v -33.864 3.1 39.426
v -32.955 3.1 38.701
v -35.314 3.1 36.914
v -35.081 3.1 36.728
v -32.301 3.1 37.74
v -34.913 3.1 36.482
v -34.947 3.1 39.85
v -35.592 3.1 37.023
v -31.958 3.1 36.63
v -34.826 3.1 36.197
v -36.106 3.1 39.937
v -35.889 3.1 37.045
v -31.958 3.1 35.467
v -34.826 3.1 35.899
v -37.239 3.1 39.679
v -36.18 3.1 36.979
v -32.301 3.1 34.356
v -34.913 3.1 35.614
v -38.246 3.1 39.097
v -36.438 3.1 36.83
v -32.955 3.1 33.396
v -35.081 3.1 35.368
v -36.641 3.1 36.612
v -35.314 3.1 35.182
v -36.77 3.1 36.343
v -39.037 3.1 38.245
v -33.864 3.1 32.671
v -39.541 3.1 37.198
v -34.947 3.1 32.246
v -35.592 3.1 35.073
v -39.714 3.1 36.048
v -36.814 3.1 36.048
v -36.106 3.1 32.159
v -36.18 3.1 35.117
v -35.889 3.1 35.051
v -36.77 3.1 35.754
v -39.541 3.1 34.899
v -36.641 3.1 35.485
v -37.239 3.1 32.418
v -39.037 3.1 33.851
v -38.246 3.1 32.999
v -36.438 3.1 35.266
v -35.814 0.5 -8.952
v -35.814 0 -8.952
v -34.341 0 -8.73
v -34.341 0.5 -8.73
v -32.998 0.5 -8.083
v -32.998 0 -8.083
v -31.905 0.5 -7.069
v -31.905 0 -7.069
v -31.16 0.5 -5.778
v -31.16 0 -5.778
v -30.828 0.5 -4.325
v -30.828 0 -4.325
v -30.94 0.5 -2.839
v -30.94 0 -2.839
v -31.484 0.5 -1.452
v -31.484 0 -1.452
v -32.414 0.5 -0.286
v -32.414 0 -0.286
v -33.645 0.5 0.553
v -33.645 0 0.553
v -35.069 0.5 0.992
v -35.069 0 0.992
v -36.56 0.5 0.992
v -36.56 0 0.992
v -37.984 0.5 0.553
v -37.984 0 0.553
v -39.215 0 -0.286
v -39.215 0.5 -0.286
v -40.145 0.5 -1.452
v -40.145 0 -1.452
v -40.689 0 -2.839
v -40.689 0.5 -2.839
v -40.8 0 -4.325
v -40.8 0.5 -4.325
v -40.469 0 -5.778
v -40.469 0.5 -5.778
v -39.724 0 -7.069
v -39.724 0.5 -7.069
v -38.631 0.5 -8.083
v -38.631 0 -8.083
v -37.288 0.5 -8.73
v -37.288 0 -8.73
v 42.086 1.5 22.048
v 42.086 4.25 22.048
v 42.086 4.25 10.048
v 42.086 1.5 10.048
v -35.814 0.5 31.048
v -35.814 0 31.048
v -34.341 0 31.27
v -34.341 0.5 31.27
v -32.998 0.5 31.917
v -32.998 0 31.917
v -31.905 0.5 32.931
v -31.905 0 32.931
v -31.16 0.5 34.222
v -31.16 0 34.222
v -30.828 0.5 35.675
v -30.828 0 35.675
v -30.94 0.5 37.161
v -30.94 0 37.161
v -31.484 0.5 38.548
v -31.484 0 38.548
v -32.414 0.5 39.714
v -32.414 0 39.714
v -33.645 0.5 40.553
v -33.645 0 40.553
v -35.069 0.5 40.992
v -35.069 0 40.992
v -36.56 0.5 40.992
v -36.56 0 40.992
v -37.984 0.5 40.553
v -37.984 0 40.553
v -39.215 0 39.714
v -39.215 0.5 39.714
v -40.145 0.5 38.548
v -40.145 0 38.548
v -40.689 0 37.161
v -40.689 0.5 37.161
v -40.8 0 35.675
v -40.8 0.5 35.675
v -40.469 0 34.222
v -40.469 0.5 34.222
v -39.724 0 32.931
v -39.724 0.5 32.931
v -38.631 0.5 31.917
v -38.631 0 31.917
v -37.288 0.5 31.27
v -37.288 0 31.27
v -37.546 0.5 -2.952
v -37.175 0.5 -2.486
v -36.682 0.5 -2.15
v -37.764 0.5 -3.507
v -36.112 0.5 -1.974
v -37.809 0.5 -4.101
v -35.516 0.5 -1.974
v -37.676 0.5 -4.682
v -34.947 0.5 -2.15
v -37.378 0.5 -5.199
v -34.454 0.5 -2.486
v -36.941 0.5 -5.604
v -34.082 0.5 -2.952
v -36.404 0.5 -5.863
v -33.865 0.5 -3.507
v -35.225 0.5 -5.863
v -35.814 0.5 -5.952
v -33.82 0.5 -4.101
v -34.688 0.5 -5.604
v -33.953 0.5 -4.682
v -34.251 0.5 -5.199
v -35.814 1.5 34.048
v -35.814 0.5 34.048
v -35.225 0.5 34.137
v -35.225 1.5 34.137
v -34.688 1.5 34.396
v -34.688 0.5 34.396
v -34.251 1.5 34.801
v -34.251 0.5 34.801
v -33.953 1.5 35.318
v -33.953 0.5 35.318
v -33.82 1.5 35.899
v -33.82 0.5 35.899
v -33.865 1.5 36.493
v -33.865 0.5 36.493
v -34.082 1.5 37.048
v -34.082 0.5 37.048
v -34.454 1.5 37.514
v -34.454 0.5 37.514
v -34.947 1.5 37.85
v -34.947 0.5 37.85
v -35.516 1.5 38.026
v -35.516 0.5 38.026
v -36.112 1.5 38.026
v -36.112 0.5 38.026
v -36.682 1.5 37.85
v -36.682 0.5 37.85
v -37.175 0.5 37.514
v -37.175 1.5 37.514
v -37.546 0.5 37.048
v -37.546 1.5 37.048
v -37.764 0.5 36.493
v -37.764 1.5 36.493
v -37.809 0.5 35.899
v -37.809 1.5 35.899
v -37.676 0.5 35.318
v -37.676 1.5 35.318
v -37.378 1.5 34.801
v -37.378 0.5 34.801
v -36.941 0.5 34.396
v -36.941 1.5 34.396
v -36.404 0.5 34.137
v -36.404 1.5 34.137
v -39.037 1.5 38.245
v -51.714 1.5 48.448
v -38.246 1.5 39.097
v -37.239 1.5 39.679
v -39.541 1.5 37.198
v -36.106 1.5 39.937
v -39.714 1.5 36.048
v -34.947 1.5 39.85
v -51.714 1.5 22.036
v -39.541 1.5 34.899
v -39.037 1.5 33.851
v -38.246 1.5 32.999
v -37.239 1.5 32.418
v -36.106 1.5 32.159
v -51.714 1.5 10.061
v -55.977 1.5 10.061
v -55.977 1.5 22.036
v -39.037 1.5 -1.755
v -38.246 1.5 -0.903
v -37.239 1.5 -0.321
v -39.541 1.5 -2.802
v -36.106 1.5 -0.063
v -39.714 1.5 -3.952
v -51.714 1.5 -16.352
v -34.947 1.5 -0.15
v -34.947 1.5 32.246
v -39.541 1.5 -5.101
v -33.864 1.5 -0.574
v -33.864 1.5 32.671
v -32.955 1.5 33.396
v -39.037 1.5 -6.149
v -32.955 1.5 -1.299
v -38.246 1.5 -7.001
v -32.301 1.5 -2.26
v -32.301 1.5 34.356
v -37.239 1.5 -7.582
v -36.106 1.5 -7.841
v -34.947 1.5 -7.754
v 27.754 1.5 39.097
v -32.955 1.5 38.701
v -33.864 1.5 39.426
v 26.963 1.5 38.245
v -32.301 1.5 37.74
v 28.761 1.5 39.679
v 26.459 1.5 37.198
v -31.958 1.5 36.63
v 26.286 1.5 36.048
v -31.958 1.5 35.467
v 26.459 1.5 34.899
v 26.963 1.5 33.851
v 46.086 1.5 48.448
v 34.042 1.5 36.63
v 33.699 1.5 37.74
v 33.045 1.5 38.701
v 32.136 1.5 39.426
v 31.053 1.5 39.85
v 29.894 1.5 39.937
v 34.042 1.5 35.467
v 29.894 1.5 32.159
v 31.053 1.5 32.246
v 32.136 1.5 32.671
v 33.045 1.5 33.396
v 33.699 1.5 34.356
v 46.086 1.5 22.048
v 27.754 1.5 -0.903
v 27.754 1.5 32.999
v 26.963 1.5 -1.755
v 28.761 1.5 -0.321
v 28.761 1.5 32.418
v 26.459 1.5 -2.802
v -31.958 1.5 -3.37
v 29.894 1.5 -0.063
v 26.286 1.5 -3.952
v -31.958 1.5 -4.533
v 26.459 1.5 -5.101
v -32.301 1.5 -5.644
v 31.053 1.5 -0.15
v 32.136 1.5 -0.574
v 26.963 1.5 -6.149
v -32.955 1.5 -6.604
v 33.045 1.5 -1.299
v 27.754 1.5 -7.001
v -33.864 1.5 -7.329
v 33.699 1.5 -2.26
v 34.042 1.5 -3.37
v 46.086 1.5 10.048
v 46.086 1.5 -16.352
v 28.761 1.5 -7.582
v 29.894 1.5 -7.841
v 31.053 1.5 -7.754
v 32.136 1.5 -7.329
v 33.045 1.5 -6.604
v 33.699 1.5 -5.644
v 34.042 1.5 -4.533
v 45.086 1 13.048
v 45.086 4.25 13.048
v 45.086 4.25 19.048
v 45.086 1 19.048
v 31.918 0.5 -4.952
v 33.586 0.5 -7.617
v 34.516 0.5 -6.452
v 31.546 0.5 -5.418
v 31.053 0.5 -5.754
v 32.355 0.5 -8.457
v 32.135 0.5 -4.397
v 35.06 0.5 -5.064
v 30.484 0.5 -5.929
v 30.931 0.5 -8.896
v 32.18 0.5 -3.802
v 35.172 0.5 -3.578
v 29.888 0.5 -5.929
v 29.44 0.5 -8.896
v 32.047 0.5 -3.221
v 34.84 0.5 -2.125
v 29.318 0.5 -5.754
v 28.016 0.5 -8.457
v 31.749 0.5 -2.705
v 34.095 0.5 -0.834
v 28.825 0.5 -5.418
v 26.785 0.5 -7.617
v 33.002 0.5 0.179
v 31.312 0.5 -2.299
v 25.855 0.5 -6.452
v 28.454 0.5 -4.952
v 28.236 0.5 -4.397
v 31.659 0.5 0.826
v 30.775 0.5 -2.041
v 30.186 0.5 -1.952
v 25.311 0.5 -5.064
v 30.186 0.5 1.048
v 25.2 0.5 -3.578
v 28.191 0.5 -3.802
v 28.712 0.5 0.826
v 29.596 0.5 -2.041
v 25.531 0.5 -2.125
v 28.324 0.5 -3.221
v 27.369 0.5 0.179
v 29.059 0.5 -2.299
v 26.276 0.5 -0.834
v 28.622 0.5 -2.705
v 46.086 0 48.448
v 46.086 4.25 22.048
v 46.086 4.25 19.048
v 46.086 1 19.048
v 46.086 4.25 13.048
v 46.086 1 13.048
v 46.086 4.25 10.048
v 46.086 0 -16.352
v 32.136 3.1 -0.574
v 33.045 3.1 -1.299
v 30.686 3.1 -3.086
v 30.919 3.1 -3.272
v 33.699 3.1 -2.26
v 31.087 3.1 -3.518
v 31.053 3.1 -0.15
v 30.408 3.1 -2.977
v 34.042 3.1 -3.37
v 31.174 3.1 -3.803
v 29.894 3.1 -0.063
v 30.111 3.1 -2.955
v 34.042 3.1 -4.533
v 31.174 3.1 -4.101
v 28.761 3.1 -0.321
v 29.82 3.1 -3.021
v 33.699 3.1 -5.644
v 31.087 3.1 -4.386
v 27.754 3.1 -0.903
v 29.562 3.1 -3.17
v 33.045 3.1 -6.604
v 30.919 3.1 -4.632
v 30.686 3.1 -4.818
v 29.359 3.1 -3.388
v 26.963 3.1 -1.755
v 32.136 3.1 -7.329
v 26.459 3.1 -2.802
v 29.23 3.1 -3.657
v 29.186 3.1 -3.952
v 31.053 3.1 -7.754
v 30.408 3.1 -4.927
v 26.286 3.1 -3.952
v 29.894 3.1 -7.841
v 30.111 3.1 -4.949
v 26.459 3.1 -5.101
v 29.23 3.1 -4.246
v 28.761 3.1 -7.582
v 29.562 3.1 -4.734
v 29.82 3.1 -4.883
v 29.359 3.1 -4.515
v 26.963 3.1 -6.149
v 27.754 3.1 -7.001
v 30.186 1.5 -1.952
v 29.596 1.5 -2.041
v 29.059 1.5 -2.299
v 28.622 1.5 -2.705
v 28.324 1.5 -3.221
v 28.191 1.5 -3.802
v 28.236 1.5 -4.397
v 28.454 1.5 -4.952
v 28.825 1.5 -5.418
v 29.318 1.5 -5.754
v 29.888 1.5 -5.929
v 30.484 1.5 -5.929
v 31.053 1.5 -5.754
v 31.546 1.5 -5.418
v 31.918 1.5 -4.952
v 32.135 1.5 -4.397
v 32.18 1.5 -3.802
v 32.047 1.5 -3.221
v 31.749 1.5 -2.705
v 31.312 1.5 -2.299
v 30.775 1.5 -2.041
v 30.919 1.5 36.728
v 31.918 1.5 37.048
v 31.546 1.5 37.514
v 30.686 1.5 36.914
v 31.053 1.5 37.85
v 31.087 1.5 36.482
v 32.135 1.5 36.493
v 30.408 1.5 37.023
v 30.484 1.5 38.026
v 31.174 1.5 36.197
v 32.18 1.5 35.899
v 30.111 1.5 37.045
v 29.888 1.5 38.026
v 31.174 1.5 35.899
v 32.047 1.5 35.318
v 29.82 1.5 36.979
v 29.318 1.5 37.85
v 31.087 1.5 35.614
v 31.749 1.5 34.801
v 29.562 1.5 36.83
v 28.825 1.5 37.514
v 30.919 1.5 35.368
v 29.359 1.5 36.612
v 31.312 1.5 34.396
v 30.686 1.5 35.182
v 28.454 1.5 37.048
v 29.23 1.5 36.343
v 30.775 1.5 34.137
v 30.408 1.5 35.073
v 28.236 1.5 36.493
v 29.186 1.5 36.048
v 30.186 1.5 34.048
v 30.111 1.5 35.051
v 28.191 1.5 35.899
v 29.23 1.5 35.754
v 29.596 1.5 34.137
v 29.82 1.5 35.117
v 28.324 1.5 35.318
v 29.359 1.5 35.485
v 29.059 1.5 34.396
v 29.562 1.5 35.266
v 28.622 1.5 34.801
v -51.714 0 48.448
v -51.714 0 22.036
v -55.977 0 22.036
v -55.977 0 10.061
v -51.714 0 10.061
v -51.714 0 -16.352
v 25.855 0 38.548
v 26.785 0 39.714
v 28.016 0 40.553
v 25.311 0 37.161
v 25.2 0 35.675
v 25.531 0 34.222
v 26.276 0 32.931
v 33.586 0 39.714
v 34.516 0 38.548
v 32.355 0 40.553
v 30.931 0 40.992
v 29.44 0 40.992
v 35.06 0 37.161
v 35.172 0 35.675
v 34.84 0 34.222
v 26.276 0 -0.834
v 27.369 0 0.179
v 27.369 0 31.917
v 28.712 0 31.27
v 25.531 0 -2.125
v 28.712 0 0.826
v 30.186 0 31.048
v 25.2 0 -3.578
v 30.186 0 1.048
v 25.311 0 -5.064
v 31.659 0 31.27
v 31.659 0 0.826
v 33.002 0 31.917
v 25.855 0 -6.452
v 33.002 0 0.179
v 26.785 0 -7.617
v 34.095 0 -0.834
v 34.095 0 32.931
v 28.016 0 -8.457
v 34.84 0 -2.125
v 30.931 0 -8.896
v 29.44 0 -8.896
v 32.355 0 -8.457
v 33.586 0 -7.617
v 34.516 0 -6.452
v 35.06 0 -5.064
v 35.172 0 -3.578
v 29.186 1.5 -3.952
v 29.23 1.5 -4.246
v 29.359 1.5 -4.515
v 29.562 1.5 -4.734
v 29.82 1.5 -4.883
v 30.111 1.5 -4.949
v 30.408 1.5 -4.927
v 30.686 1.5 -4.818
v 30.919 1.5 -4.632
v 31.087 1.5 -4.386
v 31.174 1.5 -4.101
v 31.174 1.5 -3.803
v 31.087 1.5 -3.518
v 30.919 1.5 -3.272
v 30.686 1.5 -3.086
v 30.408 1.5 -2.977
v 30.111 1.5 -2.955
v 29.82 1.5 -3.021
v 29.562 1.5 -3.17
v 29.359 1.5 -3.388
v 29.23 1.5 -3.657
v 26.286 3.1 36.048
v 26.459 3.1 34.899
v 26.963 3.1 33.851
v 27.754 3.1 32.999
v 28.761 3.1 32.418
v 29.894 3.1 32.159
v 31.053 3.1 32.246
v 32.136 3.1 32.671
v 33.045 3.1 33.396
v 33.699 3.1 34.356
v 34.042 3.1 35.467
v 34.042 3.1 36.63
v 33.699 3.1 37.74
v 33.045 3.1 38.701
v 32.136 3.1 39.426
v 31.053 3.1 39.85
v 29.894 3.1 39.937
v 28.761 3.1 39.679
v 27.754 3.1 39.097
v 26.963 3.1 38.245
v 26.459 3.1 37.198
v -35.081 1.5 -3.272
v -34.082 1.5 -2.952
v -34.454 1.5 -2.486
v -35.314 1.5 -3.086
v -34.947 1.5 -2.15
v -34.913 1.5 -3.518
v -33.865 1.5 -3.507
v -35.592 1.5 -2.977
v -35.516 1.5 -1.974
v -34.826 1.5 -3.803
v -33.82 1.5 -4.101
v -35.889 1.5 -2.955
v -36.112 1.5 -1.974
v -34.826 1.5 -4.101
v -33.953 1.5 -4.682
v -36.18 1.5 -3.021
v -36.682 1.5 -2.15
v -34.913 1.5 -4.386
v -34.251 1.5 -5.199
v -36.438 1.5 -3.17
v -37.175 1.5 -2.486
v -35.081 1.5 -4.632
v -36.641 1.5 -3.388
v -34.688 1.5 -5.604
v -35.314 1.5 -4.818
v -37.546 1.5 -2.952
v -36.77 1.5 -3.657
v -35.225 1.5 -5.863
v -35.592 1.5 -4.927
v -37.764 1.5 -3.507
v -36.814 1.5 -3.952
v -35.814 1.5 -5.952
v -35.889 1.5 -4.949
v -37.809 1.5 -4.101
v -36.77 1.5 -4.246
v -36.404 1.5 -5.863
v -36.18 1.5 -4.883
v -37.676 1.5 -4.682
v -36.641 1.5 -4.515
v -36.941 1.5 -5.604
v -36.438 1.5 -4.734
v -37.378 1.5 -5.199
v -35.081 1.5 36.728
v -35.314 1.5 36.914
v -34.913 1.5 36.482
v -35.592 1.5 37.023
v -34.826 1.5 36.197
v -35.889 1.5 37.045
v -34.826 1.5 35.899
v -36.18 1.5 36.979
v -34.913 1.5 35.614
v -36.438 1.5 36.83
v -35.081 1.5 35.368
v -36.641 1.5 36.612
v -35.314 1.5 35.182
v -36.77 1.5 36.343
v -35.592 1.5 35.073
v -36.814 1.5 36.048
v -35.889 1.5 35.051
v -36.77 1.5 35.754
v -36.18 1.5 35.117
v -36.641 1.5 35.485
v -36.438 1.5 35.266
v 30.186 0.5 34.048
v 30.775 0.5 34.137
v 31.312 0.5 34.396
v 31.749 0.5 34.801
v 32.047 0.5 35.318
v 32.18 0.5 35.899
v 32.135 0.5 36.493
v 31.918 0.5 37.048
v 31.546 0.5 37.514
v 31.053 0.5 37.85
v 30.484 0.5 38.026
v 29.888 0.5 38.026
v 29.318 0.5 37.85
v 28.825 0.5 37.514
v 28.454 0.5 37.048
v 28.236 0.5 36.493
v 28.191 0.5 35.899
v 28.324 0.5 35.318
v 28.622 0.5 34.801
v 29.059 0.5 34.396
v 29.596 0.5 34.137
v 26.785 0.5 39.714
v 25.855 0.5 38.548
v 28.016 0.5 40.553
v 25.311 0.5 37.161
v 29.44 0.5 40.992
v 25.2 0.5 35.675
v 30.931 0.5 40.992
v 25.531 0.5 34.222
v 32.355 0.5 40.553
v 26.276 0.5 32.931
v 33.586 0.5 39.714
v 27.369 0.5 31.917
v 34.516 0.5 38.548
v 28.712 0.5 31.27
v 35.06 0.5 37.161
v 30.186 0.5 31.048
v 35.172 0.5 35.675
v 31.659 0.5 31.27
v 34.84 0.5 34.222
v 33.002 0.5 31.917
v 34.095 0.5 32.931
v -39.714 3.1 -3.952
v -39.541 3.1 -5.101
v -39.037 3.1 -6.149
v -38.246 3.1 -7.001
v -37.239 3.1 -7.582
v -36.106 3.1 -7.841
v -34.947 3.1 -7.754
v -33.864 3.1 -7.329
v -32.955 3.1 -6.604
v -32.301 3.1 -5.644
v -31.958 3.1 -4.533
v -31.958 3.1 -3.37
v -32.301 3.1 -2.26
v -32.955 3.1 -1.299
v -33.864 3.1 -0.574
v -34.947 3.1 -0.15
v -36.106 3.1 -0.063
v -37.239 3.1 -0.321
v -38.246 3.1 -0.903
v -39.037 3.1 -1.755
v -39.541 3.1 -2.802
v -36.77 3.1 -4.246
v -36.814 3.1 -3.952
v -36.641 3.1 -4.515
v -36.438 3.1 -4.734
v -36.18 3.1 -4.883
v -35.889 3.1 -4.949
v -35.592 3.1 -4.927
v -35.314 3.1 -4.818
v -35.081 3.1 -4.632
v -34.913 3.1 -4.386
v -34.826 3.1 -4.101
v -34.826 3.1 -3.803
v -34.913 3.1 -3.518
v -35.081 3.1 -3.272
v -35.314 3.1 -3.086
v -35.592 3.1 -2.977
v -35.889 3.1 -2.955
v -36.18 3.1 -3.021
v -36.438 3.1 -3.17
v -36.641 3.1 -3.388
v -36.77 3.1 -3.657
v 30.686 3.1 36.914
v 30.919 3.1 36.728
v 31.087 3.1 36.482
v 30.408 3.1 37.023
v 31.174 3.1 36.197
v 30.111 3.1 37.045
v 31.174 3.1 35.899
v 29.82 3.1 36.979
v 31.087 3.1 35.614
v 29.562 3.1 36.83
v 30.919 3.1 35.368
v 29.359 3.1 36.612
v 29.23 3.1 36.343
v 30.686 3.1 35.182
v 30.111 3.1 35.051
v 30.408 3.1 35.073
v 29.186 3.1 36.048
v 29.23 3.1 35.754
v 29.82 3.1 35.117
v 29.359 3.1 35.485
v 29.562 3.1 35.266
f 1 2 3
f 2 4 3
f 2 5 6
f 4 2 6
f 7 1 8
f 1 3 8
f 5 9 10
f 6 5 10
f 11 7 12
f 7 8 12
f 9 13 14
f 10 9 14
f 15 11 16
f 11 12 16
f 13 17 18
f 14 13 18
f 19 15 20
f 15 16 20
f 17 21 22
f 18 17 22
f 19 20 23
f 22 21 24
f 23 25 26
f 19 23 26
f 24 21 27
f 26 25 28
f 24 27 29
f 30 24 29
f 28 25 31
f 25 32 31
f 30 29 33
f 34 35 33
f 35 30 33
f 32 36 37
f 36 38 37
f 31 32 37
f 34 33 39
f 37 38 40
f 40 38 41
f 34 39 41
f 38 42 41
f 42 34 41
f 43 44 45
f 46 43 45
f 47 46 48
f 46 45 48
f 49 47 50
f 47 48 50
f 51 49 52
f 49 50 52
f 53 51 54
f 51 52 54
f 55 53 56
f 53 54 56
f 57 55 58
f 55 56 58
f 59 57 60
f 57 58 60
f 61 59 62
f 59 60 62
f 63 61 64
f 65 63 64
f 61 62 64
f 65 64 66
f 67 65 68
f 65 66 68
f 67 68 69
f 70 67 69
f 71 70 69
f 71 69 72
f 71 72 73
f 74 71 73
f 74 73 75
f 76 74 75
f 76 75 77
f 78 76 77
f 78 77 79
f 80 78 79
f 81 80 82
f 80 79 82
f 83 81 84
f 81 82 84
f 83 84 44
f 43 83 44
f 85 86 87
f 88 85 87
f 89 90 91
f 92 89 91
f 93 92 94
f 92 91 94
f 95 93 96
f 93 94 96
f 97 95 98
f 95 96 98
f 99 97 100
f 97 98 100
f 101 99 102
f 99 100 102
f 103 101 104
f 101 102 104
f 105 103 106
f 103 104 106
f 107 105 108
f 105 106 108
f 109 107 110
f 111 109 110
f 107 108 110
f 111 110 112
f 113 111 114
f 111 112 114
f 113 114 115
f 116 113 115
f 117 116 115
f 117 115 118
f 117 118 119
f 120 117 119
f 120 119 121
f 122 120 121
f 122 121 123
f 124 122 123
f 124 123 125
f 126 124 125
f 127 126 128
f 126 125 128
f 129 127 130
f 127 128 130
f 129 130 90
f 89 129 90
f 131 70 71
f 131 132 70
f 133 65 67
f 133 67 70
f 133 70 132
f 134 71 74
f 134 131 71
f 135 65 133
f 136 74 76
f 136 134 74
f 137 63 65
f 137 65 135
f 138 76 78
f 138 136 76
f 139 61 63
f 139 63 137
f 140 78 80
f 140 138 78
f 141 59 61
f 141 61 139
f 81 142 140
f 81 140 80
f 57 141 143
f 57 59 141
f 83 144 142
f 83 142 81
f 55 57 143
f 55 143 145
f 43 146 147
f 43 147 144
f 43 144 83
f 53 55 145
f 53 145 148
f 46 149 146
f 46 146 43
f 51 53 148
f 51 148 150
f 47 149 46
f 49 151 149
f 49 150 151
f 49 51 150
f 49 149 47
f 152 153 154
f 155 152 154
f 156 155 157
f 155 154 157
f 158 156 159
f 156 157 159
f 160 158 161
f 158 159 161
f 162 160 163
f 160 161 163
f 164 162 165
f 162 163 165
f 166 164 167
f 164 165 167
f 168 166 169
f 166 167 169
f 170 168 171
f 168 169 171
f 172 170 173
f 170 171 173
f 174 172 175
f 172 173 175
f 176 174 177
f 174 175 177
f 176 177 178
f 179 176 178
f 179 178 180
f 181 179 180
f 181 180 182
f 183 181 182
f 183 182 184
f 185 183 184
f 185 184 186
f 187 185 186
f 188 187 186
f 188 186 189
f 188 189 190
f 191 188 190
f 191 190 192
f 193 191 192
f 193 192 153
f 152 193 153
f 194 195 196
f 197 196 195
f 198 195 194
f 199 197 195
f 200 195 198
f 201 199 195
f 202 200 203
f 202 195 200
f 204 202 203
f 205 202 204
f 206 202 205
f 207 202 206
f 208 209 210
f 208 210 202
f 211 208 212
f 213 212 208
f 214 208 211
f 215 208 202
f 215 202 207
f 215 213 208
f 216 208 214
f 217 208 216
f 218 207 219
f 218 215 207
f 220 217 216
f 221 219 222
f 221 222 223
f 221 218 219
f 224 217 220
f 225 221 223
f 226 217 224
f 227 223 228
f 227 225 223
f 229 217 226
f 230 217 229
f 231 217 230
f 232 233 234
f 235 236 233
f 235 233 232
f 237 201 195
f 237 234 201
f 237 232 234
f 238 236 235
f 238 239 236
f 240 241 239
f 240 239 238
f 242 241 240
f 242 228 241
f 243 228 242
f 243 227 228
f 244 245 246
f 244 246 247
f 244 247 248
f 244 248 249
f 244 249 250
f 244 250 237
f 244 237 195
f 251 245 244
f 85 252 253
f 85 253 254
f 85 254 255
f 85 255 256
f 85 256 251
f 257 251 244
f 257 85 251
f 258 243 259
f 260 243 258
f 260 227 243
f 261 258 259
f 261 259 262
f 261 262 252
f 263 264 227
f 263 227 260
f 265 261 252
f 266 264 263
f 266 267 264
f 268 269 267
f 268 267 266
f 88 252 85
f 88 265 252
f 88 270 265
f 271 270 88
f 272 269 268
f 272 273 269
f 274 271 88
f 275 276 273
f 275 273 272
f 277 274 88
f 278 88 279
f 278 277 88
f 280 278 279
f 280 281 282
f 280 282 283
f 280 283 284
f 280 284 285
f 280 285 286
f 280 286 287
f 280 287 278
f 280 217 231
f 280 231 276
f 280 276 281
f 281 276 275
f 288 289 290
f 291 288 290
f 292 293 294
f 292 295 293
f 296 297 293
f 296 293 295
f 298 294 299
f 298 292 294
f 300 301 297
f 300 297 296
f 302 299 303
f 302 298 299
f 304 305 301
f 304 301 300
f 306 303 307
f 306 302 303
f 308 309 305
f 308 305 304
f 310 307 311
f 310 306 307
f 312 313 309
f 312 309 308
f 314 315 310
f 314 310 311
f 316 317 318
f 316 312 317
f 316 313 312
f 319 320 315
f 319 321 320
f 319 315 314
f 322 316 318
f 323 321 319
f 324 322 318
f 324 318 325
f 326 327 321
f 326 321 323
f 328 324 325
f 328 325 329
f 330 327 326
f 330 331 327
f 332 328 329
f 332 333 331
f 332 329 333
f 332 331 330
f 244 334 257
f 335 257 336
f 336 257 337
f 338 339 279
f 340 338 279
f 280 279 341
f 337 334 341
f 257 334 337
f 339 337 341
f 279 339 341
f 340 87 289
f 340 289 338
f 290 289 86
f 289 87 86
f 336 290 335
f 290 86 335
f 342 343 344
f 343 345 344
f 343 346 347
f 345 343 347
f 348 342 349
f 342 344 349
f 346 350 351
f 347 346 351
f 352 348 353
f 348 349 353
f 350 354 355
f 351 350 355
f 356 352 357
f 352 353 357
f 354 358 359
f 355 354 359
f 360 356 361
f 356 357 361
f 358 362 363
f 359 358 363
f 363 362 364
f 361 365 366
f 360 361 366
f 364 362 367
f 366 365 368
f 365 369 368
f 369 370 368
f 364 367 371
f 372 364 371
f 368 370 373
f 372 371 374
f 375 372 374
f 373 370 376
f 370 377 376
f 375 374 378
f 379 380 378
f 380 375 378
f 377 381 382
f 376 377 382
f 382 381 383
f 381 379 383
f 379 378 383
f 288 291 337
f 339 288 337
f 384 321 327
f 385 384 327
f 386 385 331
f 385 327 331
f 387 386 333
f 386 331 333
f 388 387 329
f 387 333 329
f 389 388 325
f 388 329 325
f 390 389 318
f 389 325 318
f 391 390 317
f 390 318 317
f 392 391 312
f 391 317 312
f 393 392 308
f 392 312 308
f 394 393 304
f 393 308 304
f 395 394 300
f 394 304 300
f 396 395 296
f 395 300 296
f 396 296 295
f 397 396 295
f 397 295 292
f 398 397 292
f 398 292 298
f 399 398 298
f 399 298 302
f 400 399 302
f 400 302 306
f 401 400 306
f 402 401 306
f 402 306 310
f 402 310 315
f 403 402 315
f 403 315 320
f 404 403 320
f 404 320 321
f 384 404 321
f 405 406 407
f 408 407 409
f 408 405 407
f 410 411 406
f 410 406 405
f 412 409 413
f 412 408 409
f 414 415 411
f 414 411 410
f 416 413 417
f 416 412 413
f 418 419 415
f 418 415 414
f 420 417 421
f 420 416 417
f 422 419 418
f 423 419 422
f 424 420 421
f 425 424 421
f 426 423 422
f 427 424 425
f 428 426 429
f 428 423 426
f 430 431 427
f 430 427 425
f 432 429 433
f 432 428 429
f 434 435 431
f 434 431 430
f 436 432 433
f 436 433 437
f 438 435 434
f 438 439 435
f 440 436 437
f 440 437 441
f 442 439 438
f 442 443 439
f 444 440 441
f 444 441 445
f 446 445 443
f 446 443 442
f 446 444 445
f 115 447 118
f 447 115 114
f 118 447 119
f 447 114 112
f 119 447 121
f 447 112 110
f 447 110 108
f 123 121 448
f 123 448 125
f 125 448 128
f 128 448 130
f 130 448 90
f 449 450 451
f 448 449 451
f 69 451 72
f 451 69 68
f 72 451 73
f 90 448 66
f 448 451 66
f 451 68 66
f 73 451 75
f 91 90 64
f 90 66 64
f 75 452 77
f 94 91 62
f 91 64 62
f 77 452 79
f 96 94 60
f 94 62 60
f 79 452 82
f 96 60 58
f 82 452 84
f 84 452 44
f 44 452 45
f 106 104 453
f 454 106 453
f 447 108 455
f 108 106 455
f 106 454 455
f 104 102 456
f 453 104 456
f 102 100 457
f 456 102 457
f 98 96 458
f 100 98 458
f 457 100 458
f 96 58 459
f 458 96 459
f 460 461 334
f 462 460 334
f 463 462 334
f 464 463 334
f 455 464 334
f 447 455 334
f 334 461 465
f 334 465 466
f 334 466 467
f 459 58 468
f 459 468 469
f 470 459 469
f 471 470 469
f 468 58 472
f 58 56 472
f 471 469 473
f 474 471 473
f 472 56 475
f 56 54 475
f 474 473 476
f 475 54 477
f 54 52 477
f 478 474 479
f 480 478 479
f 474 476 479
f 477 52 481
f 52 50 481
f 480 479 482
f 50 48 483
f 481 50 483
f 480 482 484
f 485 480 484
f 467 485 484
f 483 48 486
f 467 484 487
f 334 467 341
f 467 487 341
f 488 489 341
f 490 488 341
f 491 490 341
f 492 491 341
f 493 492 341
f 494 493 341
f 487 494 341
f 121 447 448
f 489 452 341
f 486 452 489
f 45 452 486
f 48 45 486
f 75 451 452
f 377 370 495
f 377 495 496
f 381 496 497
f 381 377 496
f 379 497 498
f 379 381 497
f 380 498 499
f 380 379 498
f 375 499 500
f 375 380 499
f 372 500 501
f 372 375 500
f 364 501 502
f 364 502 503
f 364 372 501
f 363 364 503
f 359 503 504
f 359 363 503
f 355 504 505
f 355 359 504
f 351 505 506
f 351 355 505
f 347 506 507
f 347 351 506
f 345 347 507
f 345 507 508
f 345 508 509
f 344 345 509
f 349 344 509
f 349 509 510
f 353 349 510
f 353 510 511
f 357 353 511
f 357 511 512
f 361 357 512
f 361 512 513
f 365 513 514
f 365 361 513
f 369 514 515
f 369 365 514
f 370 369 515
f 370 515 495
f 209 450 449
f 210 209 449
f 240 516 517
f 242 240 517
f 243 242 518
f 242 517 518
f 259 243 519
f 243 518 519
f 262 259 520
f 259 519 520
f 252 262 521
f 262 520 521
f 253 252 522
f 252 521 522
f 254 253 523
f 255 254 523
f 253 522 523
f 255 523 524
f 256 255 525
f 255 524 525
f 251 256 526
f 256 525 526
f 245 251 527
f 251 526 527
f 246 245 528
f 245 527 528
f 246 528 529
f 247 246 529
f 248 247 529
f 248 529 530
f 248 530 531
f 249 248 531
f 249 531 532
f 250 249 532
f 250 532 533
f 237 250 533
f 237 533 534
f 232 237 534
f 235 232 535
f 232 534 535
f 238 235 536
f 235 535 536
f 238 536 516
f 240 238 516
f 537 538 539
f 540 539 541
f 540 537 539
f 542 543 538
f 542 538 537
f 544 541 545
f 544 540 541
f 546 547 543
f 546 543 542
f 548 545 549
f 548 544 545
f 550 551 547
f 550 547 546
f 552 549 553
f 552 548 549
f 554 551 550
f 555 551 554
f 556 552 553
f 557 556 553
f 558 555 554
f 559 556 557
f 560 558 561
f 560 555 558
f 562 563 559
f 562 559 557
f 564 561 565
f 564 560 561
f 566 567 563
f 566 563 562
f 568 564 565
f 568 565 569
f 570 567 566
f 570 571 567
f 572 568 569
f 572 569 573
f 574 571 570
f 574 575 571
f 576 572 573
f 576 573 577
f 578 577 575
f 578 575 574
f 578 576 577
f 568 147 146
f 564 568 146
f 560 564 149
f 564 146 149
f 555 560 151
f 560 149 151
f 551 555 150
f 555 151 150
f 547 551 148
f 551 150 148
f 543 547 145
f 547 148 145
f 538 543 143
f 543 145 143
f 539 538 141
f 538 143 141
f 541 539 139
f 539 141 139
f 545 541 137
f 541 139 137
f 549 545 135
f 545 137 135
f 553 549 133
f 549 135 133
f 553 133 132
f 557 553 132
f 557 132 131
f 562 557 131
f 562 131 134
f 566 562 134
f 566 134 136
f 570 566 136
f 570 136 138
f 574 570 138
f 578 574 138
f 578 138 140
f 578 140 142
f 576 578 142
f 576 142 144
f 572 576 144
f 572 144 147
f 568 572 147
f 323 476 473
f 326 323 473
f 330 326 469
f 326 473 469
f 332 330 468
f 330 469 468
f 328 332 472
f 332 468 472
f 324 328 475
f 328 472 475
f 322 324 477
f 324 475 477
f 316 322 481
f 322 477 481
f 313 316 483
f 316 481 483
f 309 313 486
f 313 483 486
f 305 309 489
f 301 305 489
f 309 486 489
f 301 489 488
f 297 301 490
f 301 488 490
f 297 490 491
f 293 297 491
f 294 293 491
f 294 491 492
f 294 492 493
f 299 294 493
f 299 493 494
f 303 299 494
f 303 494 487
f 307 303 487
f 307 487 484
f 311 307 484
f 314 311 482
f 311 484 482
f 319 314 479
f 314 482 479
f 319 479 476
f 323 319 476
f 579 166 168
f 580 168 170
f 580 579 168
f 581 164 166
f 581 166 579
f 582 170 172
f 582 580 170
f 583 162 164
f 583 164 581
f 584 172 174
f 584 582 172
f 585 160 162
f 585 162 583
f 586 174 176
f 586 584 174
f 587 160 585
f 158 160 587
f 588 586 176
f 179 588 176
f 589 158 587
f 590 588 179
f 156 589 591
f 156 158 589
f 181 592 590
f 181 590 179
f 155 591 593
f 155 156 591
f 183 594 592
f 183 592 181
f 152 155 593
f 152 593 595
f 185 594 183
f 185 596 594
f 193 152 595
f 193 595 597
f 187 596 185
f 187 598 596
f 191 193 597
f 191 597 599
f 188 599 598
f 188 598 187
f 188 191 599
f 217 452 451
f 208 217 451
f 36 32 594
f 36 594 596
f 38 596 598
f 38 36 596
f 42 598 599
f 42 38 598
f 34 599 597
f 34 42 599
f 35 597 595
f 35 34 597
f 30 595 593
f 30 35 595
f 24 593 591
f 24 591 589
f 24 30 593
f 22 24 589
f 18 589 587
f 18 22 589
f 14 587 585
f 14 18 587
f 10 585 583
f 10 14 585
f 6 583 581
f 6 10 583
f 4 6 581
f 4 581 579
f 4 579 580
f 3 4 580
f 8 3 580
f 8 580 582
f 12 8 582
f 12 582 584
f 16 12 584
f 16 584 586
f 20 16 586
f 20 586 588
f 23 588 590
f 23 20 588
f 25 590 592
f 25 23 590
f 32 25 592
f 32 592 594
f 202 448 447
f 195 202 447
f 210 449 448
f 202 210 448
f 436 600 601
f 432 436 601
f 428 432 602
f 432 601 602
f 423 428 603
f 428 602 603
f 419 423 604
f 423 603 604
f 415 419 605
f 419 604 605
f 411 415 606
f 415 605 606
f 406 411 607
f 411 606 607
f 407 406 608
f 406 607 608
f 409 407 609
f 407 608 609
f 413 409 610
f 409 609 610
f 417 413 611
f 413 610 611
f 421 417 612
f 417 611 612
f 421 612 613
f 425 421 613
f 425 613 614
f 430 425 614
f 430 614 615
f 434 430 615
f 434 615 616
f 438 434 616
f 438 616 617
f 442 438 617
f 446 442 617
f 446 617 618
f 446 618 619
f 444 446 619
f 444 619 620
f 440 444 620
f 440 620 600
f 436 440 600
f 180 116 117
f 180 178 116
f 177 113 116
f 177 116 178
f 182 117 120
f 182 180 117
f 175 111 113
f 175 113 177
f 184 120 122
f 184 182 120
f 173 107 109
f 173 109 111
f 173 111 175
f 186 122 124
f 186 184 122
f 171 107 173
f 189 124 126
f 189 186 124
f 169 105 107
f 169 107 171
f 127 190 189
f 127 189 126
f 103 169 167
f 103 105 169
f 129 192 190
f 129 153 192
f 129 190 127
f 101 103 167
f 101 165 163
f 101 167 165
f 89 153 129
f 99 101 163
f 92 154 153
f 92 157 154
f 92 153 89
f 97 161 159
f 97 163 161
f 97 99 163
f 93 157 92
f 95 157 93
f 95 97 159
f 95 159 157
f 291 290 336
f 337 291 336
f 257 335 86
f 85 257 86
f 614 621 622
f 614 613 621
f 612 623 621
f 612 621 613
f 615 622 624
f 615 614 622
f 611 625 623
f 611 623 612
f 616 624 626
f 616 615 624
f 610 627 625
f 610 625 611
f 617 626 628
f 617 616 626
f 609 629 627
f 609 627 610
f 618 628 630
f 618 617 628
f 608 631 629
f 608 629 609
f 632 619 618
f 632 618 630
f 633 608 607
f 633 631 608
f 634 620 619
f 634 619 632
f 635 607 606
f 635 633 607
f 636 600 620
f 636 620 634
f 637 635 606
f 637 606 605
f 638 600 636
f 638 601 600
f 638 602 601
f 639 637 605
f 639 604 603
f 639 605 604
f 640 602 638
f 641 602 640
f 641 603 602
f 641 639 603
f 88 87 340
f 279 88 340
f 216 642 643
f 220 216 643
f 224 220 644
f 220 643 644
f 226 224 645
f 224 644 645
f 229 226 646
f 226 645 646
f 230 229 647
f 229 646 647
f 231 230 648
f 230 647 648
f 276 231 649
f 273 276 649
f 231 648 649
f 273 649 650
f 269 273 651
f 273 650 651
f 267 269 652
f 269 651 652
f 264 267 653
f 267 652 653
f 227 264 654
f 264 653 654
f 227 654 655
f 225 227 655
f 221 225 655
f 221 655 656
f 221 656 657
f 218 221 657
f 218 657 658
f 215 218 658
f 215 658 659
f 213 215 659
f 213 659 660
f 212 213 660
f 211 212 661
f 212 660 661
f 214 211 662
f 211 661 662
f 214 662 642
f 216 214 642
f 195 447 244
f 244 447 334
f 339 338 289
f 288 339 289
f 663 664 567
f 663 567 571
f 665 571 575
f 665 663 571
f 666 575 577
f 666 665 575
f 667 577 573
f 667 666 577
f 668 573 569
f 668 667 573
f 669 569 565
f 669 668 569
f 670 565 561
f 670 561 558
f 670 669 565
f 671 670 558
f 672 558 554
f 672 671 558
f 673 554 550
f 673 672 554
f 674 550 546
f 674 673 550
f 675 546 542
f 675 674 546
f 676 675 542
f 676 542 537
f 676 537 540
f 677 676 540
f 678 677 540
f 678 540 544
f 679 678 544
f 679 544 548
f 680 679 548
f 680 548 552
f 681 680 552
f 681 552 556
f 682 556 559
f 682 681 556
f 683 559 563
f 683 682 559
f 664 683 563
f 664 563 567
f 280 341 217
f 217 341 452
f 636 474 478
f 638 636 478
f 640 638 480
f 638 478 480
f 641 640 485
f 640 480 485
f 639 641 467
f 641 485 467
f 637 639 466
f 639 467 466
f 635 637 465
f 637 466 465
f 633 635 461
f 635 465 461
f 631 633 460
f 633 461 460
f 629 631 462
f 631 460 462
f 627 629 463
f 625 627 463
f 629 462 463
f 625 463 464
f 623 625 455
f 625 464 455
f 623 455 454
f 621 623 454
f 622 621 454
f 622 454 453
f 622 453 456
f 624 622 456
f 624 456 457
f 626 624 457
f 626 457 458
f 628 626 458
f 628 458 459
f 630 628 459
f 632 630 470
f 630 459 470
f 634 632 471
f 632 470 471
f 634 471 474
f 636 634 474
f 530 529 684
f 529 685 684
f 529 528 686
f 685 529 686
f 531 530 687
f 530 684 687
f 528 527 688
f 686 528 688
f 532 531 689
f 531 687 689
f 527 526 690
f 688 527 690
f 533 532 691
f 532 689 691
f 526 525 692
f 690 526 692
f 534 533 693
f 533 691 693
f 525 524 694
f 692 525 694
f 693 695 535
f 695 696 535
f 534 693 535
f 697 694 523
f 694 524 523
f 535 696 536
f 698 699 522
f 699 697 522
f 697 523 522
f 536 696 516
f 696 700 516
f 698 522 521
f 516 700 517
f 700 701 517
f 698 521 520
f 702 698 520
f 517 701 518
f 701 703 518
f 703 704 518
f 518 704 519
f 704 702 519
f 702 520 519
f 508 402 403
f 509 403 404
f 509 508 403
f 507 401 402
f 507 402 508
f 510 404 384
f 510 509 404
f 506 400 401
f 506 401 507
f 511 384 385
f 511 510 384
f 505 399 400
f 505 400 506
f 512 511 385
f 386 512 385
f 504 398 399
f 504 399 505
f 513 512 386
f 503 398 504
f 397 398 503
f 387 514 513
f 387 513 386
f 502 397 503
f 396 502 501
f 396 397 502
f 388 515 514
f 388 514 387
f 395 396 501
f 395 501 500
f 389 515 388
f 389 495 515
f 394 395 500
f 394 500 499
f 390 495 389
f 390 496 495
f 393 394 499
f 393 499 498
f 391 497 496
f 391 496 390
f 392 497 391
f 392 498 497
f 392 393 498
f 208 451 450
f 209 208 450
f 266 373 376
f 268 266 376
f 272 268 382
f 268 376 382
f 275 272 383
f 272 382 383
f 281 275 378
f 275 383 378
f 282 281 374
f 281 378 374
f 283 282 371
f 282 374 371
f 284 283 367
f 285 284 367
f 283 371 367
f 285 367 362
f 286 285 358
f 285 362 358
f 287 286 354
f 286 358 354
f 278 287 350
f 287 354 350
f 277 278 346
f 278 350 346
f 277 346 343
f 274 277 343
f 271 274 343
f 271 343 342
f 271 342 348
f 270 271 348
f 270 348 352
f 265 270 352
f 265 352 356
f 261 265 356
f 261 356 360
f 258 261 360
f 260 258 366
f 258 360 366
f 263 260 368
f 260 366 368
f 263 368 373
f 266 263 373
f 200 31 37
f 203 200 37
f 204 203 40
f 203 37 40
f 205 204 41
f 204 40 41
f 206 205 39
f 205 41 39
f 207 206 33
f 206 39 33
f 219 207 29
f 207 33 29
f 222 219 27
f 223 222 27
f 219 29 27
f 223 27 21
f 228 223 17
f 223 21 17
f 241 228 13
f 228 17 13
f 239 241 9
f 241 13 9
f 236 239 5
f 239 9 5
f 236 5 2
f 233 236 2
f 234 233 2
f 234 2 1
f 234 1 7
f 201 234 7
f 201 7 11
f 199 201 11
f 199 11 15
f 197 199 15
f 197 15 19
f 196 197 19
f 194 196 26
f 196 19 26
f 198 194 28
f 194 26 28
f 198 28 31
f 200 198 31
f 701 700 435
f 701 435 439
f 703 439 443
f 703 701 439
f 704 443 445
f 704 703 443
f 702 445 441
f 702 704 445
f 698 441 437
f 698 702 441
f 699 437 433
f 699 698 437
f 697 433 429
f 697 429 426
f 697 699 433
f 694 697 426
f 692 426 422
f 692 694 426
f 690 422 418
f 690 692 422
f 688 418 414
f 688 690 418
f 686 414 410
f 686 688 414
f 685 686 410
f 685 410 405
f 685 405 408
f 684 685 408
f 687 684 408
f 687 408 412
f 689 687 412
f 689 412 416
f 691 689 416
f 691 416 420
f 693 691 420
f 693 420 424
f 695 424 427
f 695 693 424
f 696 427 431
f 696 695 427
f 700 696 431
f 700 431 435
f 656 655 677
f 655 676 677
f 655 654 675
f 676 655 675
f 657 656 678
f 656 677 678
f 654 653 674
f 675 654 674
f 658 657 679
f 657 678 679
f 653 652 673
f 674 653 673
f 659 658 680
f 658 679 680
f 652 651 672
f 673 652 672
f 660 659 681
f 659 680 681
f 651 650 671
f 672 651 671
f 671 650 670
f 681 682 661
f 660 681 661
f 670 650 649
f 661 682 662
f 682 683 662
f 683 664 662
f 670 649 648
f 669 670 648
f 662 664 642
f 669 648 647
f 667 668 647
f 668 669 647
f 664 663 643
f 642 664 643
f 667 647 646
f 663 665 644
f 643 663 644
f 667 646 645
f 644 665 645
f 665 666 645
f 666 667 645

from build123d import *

# Parameters (mm, degrees)
EXTRUDE_1_DEPTH     = 1.5
SKETCH_2_R          = 5
CUT_EXTRUDE_1_DEPTH = 0.5
LED_3_START         = -4.25
LED_3_DEPTH         = 2.75
CUT_EXTRUDE_2_REACH = 76.153
SKETCH_15_R         = 2
EXTRUDE_START       = -3.1
SKETCH_16_R         = 3.9
SKETCH_16_R_2       = 1
EXTRUDE_4_DEPTH     = 1.6
LED_2_START         = -1.5
SKETCH_17_W         = 1
SKETCH_17_H         = 6
LED_2_DEPTH         = 0.5


with BuildPart() as part:
    # 草图1 → 凸台-拉伸1 (new body)
    with BuildSketch(Plane(origin=(0, 0, 0), x_dir=(1, 0, 0), z_dir=(0, 1, 0))):
        Polygon((-51.714401711, -10.060969859), (-55.976720774, -10.060969859), (-55.976720774, -22.035569809), (-51.714401711, -22.035569809), (-51.714401711, -48.448269834), (46.085598289, -48.448269834), (46.085598289, 16.351730166), (-51.714401711, 16.351730166), align=None)
    extrude(amount=EXTRUDE_1_DEPTH)

    # 草图2 → 防滑切除-拉伸1 (cut)
    with BuildSketch(Plane.XZ):
        with Locations(Location((-35.814401712, 36.048269834, 0), (0, 0, 270))):
            Circle(SKETCH_2_R)
        with Locations(Location((30.185598288, -3.951730166, 0), (0, 0, 90))):
            Circle(SKETCH_2_R)
        with Locations(Location((-35.814401712, -3.951730166, 0), (0, 0, 270))):
            Circle(SKETCH_2_R)
        with Locations(Location((30.185598288, 36.048269834, 0), (0, 0, 270))):
            Circle(SKETCH_2_R)
    extrude(amount=-CUT_EXTRUDE_1_DEPTH, mode=Mode.SUBTRACT)

    # 草图14 → LED限位凸台-拉伸3 (add)
    with BuildSketch(Plane.XZ.offset(LED_3_START)):
        Polygon((45.085598289, 13.048269834), (45.085598289, 19.048269834), (46.085598289, 19.048269834), (46.085598289, 22.048269834), (42.085598289, 22.048269834), (42.085598289, 10.048269834), (46.085598289, 10.048269834), (46.085598289, 13.048269834), align=None)
    extrude(amount=LED_3_DEPTH)

    # 草图15 → 螺丝孔位切除-拉伸2 (cut, up to next)
    with BuildSketch(Plane.XZ, mode=Mode.PRIVATE) as cut_extrude_2_sk1:
        with Locations(Location((-35.814401712, 36.048269834, 0), (0, 0, 270))):
            Circle(SKETCH_15_R)
    cut_extrude_2_tool1 = extrude(cut_extrude_2_sk1.sketch, amount=-CUT_EXTRUDE_2_REACH, mode=Mode.PRIVATE) & part.part
    # 草图15 → 螺丝孔位切除-拉伸2 (cut, up to next)
    with BuildSketch(Plane.XZ, mode=Mode.PRIVATE) as cut_extrude_2_sk2:
        with Locations(Location((30.185598288, 36.048269834, 0), (0, 0, 270))):
            Circle(SKETCH_15_R)
    cut_extrude_2_tool2 = extrude(cut_extrude_2_sk2.sketch, amount=-CUT_EXTRUDE_2_REACH, mode=Mode.PRIVATE) & part.part
    # 草图15 → 螺丝孔位切除-拉伸2 (cut, up to next)
    with BuildSketch(Plane.XZ, mode=Mode.PRIVATE) as cut_extrude_2_sk3:
        with Locations(Location((30.185598288, -3.951730166, 0), (0, 0, 90))):
            Circle(SKETCH_15_R)
    cut_extrude_2_tool3 = extrude(cut_extrude_2_sk3.sketch, amount=-CUT_EXTRUDE_2_REACH, mode=Mode.PRIVATE) & part.part
    # 草图15 → 螺丝孔位切除-拉伸2 (cut, up to next)
    with BuildSketch(Plane.XZ, mode=Mode.PRIVATE) as cut_extrude_2_sk4:
        with Locations(Location((-35.814401712, -3.951730166, 0), (0, 0, 270))):
            Circle(SKETCH_15_R)
    cut_extrude_2_tool4 = extrude(cut_extrude_2_sk4.sketch, amount=-CUT_EXTRUDE_2_REACH, mode=Mode.PRIVATE) & part.part
    add(cut_extrude_2_tool1.solids().sort_by_distance((-35.814402, 0, 36.04827))[0], mode=Mode.SUBTRACT)
    add(cut_extrude_2_tool2.solids().sort_by_distance((30.185598, 0, 36.04827))[0], mode=Mode.SUBTRACT)
    add(cut_extrude_2_tool3.solids().sort_by_distance((30.185598, 0, -3.95173))[0], mode=Mode.SUBTRACT)
    add(cut_extrude_2_tool4.solids().sort_by_distance((-35.814402, 0, -3.95173))[0], mode=Mode.SUBTRACT)

    # 草图16 → 螺丝孔凸台-拉伸4 (add)
    # profile 1 of 4: a face of its own
    with BuildSketch(Plane.XZ.offset(EXTRUDE_START)):
        with Locations(Location((-35.814401712, 36.048269834, 0), (0, 0, 180))):
            Circle(SKETCH_16_R)
        with Locations(Location((-35.814401712, 36.048269834, 0), (0, 0, 180))):
            Circle(SKETCH_16_R_2, mode=Mode.SUBTRACT)
    # profile 2 of 4: a face of its own
    with BuildSketch(Plane.XZ.offset(EXTRUDE_START)):
        with Locations(Location((30.185598288, 36.048269834, 0), (0, 0, 180))):
            Circle(SKETCH_16_R)
        with Locations(Location((30.185598288, 36.048269834, 0), (0, 0, 180))):
            Circle(SKETCH_16_R_2, mode=Mode.SUBTRACT)
    # profile 3 of 4: a face of its own
    with BuildSketch(Plane.XZ.offset(EXTRUDE_START)):
        with Locations(Location((30.185598288, -3.951730166, 0), (0, 0, 180))):
            Circle(SKETCH_16_R)
        with Locations(Location((30.185598288, -3.951730166, 0), (0, 0, 180))):
            Circle(SKETCH_16_R_2, mode=Mode.SUBTRACT)
    # profile 4 of 4: a face of its own
    with BuildSketch(Plane.XZ.offset(EXTRUDE_START)):
        with Locations(Location((-35.814401712, -3.951730166, 0), (0, 0, 180))):
            Circle(SKETCH_16_R)
        with Locations(Location((-35.814401712, -3.951730166, 0), (0, 0, 180))):
            Circle(SKETCH_16_R_2, mode=Mode.SUBTRACT)
    extrude(amount=EXTRUDE_4_DEPTH)

    # 草图17 → LED灯嵌入切除-拉伸2 (cut)
    with BuildSketch(Plane.XZ.offset(LED_2_START)):
        with Locations((45.585598289, 16.048269834)):
            Rectangle(SKETCH_17_W, SKETCH_17_H)
    extrude(amount=LED_2_DEPTH, mode=Mode.SUBTRACT)


solid = part.part
